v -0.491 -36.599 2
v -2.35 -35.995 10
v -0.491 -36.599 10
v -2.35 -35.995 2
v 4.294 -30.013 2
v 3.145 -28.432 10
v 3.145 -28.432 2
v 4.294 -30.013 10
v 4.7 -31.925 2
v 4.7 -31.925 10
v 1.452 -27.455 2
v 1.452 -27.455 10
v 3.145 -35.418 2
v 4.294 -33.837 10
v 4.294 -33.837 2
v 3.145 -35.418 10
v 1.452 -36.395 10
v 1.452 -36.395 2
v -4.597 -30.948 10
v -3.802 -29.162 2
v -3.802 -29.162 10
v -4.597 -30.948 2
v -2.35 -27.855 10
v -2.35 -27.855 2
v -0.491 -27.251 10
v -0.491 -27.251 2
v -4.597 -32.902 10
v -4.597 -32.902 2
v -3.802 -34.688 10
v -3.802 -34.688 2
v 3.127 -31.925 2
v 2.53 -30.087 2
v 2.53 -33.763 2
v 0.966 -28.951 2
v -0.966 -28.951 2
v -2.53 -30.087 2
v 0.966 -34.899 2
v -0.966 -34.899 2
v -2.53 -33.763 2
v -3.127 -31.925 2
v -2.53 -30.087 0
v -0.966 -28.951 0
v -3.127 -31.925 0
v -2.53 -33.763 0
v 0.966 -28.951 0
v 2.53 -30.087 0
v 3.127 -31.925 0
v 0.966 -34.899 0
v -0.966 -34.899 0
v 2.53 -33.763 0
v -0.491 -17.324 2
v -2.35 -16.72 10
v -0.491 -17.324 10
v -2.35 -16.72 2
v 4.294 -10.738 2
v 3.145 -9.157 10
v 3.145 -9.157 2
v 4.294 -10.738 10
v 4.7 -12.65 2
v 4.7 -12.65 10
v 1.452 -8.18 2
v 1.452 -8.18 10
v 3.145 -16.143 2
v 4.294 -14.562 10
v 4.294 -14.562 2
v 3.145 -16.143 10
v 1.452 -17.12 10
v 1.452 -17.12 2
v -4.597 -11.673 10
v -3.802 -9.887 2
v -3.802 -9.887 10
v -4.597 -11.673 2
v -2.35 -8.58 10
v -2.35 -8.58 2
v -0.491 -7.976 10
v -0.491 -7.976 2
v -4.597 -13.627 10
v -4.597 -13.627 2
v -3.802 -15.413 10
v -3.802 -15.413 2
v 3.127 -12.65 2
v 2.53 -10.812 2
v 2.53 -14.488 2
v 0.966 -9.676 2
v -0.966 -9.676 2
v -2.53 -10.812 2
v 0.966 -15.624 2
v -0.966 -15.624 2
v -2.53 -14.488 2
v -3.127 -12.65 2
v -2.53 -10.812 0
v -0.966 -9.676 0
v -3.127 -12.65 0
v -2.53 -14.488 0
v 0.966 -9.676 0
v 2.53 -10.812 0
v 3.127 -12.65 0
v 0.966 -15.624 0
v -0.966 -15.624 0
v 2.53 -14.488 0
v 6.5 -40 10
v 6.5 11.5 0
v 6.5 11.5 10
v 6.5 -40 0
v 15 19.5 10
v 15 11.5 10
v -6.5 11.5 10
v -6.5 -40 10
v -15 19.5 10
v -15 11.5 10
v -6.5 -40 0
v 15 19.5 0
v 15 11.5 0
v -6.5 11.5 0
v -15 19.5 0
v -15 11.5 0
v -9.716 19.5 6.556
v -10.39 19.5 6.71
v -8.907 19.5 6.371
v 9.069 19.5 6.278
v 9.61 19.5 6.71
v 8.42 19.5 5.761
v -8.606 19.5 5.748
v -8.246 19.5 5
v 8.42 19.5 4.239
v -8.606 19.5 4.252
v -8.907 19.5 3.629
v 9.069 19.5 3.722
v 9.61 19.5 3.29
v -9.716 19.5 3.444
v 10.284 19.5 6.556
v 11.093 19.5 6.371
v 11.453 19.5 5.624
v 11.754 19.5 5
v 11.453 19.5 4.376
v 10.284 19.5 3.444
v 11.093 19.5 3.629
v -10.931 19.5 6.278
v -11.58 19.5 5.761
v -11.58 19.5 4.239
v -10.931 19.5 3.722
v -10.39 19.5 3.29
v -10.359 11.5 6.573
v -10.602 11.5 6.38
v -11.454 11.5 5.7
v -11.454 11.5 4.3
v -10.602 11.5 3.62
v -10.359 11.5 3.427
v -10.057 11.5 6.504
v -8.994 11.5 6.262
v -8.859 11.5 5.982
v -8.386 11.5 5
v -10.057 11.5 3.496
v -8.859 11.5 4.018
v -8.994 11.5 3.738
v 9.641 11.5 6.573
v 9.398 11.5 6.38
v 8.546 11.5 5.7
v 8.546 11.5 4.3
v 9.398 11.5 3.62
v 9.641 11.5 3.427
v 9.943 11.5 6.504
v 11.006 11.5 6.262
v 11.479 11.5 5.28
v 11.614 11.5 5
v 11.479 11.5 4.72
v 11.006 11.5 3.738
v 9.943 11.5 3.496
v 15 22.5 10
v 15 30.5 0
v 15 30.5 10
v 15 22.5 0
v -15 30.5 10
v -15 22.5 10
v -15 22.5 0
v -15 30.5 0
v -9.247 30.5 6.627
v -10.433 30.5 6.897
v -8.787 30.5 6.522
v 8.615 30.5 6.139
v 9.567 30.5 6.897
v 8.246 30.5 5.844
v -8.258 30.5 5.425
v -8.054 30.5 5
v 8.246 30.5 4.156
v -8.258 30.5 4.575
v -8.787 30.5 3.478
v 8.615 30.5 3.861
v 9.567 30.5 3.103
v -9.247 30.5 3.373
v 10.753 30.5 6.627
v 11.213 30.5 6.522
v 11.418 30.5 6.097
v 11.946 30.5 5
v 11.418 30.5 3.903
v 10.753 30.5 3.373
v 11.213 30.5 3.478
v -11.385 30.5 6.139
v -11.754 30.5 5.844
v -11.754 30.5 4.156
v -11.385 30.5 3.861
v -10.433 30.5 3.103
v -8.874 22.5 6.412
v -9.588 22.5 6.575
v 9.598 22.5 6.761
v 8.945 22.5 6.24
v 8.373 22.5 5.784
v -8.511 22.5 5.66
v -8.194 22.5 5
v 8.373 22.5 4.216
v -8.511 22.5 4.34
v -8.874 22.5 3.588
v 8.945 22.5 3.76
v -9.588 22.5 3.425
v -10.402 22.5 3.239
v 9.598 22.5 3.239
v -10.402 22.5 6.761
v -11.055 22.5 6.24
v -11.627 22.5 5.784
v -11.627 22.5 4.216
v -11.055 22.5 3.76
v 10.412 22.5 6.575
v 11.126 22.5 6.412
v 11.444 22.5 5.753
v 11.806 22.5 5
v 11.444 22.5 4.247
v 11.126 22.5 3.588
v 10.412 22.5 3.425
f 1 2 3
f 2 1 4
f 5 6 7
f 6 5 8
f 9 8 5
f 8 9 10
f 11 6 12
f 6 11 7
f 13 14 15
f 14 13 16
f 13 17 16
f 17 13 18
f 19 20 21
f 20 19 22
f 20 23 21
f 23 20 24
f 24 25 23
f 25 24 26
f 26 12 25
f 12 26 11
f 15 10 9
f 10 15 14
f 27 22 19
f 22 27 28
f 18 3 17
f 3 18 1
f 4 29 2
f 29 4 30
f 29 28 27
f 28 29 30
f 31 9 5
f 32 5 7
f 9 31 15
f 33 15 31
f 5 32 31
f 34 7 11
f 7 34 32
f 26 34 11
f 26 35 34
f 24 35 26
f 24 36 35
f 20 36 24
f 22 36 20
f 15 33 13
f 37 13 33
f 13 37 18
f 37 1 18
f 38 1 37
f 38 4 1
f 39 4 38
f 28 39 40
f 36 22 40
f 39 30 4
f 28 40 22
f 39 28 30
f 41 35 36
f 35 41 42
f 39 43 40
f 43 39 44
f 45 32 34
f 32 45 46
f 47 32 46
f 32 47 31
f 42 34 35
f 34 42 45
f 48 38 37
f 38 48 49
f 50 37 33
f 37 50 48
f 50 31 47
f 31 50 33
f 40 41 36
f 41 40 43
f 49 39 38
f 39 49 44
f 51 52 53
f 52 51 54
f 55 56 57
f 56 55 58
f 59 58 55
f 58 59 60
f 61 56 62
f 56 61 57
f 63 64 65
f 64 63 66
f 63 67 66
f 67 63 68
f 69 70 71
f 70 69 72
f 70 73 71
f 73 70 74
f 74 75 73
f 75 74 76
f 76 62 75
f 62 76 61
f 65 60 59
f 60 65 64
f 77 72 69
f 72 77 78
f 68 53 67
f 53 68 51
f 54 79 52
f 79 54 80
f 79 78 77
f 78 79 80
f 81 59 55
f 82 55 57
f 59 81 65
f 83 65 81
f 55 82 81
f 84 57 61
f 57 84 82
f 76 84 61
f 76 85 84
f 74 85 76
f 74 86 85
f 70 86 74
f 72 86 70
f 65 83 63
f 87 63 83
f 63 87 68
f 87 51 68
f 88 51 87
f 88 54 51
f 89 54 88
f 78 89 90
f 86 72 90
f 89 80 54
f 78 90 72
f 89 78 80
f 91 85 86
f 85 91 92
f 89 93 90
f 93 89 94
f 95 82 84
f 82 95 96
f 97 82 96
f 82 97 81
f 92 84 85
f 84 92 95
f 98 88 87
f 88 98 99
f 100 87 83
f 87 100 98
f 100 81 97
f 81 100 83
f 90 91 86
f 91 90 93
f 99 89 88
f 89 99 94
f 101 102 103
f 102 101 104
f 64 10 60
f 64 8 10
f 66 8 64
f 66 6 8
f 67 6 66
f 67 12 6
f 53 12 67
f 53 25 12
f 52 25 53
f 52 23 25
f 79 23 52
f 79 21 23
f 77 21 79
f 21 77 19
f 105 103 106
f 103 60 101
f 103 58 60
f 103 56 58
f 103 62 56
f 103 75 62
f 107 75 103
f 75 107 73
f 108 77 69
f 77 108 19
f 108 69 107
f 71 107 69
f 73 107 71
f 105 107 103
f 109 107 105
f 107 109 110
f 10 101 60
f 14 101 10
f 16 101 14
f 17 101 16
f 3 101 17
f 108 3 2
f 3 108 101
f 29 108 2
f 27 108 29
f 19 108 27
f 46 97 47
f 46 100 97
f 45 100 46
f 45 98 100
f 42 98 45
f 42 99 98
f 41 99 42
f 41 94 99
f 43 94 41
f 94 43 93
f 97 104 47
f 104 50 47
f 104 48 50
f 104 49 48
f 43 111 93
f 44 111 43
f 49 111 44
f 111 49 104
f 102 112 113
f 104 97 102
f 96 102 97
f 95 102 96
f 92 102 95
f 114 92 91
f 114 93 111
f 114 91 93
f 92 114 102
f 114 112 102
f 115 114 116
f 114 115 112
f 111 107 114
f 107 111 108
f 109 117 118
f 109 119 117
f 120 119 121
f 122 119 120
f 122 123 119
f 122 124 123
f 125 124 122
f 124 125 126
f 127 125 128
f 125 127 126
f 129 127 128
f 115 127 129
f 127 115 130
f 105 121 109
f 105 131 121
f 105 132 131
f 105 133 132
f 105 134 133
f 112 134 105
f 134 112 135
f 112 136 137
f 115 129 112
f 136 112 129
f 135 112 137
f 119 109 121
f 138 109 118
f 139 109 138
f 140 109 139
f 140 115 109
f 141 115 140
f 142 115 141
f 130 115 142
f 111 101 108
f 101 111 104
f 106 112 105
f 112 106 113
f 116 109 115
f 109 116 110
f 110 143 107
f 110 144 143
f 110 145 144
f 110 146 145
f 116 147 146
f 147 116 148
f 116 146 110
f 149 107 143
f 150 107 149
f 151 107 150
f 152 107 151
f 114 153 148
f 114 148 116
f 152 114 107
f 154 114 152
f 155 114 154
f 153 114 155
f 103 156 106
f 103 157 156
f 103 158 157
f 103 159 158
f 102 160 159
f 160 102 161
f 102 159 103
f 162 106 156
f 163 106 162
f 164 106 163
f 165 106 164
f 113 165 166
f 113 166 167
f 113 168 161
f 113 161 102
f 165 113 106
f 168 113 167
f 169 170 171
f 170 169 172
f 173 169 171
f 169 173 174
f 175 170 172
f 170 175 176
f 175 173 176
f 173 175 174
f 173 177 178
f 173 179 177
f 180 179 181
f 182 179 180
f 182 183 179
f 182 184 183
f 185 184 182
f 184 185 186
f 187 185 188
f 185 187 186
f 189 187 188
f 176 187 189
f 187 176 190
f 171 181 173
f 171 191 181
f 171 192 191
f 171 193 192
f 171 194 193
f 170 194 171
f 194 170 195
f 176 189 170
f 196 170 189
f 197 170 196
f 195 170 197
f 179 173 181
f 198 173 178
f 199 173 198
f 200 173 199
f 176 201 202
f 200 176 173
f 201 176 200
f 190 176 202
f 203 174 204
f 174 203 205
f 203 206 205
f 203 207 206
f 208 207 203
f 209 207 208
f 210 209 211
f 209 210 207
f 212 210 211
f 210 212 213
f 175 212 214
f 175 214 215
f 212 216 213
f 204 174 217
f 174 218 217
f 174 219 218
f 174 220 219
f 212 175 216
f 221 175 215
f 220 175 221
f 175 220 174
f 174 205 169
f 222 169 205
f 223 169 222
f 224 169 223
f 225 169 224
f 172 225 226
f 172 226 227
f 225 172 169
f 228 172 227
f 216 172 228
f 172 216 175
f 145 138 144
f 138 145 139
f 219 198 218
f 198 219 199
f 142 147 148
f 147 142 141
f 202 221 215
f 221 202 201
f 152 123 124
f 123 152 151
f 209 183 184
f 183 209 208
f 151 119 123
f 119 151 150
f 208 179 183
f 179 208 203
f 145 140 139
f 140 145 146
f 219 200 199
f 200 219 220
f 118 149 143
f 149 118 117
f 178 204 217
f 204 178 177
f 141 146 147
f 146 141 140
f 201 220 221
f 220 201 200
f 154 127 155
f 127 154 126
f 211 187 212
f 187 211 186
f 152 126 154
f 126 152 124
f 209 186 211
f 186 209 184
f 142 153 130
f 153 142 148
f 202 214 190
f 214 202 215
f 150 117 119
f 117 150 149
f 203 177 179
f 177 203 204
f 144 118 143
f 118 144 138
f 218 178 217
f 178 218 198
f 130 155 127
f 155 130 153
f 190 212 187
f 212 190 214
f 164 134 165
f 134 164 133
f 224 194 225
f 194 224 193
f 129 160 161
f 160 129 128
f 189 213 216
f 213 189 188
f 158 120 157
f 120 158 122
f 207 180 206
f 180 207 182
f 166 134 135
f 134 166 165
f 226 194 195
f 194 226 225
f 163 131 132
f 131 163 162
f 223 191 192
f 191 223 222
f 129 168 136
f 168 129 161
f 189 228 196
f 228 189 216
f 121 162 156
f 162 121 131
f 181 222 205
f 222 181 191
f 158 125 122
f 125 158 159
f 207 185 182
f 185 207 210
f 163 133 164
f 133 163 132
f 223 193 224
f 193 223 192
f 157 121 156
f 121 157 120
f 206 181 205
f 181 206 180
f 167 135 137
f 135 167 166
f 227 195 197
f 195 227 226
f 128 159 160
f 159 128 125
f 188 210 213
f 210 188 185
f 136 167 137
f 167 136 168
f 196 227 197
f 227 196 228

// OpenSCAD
/**
 *   Belt Tensioner source,
 *   Copyright (C) 2012  James M Adams
 *
 *   This program is free software: you can redistribute it and/or modify
 *   it under the terms of the GNU Lesser General Public License as published by
 *   the Free Software Foundation, either version 3 of the License, or
 *   any later version.
 *
 *   This program is distributed in the hope that it will be useful,
 *   but WITHOUT ANY WARRANTY; without even the implied warranty of
 *   MERCHANTABILITY or FITNESS FOR A PARTICULAR PURPOSE.  See the
 *   GNU Lesser General Public License for more details.
 *
 *   You should have received a copy of the GNU Lesser General Public License
 *   along with this program.  If not, see <http://www.gnu.org/licenses/>.
 */

//Controls the height of the bar 
barL = 51.5;

//changes the fatness of the part
height = 10;


//MAIN - Generates the part by calling submodules
translate([0,-40,0])
union() {
    bar();

    difference(){
        union(){
            crossBar();
            topBar();
        }

        union(){
            translate([-10,0,0,])
            hScrew();

            translate([10,0,0,])
                hScrew();
        }
    }
}


/**
 *The two 3mm screw holes
 */
module hScrew() {
    translate([0,75,height/2])
    rotate([90,0,0])
    translate([0,0,-10])
    cylinder(40,2.2,1.5);
}


/**
 *Called to create the two crossbars
 */
module crossBar() {
    translate([-15,barL-0,0])
    cube([30,8,height]);
}


/**
 *The bar section of the T, contains the two 5mm screw hole
 */
module bar() {
    barE = 21.5;
    preferred = 13.5;

    difference() {
        union() {
            translate([-6.5,0,0]){
                cube([13,barL+barE-preferred,height]);
            }
        }

        //subtraction
        union() {
            //bottom hole
            translate([0,8.075,-1])
            screw5mm();

            //middle hole
            translate([0,27.35,-1])
            screw5mm();
        }
    }
}


/**
 * Top bar not connected to the T section
 */
module topBar() {
    translate([0,11,0])
    crossBar();
}


/**
 *Cutout for the 5mm screw and head
 */
module screw5mm() {

//five mm hole radius
screw5 = 3.1275;
screw5Top = 4.7;
screw5topH = 5;

   translate([0,0,-7])
    union() {
        translate([0,0,10]){
        cylinder(screw5topH+height,screw5Top,screw5Top);}
        cylinder(15,screw5,screw5);
    }
}
